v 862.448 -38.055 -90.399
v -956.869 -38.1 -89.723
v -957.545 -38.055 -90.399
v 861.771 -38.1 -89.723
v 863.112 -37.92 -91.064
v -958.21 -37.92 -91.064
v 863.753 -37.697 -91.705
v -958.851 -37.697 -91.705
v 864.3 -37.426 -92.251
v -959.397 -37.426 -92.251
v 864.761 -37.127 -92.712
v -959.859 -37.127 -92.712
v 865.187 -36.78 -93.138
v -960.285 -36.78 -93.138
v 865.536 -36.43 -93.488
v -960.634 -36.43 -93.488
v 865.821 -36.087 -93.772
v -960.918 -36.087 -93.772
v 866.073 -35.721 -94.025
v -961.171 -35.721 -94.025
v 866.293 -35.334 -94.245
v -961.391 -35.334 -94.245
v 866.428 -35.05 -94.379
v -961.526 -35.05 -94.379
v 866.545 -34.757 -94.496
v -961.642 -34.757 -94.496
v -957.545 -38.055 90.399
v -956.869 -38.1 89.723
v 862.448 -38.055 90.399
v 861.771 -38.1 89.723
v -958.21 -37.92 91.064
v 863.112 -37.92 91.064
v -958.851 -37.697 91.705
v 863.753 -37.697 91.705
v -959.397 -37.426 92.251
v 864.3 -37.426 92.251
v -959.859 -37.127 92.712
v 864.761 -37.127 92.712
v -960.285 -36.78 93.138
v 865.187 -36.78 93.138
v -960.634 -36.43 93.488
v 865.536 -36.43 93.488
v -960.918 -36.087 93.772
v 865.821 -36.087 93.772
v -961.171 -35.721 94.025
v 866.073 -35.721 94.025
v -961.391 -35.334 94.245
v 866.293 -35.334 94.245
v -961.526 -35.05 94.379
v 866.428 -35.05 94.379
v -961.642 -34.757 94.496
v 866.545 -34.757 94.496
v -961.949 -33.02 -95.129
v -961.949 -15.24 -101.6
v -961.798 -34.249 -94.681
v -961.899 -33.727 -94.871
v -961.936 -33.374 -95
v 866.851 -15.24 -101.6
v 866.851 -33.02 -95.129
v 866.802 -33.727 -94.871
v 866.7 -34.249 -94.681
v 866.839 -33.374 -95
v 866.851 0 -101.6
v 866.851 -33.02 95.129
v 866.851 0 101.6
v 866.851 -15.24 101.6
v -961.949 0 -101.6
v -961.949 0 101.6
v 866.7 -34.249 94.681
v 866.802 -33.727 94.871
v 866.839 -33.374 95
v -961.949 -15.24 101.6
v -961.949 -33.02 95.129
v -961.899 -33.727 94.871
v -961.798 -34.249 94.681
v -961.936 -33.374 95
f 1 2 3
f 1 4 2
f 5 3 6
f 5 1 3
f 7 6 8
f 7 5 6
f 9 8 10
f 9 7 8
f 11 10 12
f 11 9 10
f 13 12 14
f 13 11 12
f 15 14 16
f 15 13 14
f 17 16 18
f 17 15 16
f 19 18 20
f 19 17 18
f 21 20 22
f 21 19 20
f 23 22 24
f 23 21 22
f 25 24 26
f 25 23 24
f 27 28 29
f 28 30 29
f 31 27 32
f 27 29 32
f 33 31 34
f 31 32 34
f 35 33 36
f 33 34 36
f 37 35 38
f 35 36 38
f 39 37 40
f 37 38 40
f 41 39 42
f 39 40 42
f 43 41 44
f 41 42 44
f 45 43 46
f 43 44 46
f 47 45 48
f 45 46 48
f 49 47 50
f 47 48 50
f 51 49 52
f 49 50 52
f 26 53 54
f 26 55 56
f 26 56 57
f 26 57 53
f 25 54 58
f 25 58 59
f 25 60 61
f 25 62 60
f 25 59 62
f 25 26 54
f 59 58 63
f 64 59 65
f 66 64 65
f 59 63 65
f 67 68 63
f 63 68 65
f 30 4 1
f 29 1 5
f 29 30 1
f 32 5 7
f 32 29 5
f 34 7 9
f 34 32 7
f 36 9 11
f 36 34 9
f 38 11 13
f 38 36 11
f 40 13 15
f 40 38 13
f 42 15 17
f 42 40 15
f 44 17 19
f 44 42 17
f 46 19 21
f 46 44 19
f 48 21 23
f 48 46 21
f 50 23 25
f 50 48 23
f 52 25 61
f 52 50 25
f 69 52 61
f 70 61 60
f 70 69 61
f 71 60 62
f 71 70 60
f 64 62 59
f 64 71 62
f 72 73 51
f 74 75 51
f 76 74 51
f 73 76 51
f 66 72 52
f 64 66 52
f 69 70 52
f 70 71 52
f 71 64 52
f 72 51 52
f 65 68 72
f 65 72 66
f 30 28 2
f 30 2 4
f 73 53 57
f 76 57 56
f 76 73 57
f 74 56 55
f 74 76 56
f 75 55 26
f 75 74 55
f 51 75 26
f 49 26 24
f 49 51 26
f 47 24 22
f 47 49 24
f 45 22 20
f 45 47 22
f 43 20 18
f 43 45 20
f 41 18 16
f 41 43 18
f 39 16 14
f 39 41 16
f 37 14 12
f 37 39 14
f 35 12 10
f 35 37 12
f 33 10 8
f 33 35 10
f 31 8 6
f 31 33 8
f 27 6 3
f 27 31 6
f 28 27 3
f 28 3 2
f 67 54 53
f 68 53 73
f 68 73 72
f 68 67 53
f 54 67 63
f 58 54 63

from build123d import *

# Parameters (mm, degrees)
F0_W     = 1828.8
F0_H     = 203.2
F1_DEPTH = 38.1
F2_SIZE2 = 8.3203595553
F2_SIZE  = 22.86
F3_SIZE2 = 8.3203595553
F3_SIZE  = 22.86
F4_R     = 5.08


with BuildPart() as f1:
    # F0 (on Front) → F1 (new body)
    with BuildSketch(Plane.XZ):
        with Locations((-47.5488106235, 0)):
            Rectangle(F0_W, F0_H)
    extrude(amount=F1_DEPTH)

    # F2
    f2_edges = [f1.edges().sort_by_distance(p)[0] for p in [
        (-47.548811, -38.1, 101.6),
    ]]
    f2_side = f1.faces().sort_by_distance((-47.548811, -19.05, 101.6))[0]
    chamfer(f2_edges, length=F2_SIZE, length2=F2_SIZE2, reference=f2_side)

    # F3
    f3_edges = [f1.edges().sort_by_distance(p)[0] for p in [
        (-47.548811, -38.1, -101.6),
    ]]
    f3_side = f1.faces().sort_by_distance((-47.548811, -19.05, -101.6))[0]
    chamfer(f3_edges, length=F3_SIZE, length2=F3_SIZE2, reference=f3_side)

    # F4
    f4_edges = [f1.edges().sort_by_distance(p)[0] for p in [
        (-961.948811, -38.1, 0),
        (-47.548811, -38.1, -93.27964),
        (-47.548811, -38.1, 93.27964),
        (866.851189, -38.1, 0),
    ]]
    fillet(f4_edges, radius=F4_R)


solid = f1.part
